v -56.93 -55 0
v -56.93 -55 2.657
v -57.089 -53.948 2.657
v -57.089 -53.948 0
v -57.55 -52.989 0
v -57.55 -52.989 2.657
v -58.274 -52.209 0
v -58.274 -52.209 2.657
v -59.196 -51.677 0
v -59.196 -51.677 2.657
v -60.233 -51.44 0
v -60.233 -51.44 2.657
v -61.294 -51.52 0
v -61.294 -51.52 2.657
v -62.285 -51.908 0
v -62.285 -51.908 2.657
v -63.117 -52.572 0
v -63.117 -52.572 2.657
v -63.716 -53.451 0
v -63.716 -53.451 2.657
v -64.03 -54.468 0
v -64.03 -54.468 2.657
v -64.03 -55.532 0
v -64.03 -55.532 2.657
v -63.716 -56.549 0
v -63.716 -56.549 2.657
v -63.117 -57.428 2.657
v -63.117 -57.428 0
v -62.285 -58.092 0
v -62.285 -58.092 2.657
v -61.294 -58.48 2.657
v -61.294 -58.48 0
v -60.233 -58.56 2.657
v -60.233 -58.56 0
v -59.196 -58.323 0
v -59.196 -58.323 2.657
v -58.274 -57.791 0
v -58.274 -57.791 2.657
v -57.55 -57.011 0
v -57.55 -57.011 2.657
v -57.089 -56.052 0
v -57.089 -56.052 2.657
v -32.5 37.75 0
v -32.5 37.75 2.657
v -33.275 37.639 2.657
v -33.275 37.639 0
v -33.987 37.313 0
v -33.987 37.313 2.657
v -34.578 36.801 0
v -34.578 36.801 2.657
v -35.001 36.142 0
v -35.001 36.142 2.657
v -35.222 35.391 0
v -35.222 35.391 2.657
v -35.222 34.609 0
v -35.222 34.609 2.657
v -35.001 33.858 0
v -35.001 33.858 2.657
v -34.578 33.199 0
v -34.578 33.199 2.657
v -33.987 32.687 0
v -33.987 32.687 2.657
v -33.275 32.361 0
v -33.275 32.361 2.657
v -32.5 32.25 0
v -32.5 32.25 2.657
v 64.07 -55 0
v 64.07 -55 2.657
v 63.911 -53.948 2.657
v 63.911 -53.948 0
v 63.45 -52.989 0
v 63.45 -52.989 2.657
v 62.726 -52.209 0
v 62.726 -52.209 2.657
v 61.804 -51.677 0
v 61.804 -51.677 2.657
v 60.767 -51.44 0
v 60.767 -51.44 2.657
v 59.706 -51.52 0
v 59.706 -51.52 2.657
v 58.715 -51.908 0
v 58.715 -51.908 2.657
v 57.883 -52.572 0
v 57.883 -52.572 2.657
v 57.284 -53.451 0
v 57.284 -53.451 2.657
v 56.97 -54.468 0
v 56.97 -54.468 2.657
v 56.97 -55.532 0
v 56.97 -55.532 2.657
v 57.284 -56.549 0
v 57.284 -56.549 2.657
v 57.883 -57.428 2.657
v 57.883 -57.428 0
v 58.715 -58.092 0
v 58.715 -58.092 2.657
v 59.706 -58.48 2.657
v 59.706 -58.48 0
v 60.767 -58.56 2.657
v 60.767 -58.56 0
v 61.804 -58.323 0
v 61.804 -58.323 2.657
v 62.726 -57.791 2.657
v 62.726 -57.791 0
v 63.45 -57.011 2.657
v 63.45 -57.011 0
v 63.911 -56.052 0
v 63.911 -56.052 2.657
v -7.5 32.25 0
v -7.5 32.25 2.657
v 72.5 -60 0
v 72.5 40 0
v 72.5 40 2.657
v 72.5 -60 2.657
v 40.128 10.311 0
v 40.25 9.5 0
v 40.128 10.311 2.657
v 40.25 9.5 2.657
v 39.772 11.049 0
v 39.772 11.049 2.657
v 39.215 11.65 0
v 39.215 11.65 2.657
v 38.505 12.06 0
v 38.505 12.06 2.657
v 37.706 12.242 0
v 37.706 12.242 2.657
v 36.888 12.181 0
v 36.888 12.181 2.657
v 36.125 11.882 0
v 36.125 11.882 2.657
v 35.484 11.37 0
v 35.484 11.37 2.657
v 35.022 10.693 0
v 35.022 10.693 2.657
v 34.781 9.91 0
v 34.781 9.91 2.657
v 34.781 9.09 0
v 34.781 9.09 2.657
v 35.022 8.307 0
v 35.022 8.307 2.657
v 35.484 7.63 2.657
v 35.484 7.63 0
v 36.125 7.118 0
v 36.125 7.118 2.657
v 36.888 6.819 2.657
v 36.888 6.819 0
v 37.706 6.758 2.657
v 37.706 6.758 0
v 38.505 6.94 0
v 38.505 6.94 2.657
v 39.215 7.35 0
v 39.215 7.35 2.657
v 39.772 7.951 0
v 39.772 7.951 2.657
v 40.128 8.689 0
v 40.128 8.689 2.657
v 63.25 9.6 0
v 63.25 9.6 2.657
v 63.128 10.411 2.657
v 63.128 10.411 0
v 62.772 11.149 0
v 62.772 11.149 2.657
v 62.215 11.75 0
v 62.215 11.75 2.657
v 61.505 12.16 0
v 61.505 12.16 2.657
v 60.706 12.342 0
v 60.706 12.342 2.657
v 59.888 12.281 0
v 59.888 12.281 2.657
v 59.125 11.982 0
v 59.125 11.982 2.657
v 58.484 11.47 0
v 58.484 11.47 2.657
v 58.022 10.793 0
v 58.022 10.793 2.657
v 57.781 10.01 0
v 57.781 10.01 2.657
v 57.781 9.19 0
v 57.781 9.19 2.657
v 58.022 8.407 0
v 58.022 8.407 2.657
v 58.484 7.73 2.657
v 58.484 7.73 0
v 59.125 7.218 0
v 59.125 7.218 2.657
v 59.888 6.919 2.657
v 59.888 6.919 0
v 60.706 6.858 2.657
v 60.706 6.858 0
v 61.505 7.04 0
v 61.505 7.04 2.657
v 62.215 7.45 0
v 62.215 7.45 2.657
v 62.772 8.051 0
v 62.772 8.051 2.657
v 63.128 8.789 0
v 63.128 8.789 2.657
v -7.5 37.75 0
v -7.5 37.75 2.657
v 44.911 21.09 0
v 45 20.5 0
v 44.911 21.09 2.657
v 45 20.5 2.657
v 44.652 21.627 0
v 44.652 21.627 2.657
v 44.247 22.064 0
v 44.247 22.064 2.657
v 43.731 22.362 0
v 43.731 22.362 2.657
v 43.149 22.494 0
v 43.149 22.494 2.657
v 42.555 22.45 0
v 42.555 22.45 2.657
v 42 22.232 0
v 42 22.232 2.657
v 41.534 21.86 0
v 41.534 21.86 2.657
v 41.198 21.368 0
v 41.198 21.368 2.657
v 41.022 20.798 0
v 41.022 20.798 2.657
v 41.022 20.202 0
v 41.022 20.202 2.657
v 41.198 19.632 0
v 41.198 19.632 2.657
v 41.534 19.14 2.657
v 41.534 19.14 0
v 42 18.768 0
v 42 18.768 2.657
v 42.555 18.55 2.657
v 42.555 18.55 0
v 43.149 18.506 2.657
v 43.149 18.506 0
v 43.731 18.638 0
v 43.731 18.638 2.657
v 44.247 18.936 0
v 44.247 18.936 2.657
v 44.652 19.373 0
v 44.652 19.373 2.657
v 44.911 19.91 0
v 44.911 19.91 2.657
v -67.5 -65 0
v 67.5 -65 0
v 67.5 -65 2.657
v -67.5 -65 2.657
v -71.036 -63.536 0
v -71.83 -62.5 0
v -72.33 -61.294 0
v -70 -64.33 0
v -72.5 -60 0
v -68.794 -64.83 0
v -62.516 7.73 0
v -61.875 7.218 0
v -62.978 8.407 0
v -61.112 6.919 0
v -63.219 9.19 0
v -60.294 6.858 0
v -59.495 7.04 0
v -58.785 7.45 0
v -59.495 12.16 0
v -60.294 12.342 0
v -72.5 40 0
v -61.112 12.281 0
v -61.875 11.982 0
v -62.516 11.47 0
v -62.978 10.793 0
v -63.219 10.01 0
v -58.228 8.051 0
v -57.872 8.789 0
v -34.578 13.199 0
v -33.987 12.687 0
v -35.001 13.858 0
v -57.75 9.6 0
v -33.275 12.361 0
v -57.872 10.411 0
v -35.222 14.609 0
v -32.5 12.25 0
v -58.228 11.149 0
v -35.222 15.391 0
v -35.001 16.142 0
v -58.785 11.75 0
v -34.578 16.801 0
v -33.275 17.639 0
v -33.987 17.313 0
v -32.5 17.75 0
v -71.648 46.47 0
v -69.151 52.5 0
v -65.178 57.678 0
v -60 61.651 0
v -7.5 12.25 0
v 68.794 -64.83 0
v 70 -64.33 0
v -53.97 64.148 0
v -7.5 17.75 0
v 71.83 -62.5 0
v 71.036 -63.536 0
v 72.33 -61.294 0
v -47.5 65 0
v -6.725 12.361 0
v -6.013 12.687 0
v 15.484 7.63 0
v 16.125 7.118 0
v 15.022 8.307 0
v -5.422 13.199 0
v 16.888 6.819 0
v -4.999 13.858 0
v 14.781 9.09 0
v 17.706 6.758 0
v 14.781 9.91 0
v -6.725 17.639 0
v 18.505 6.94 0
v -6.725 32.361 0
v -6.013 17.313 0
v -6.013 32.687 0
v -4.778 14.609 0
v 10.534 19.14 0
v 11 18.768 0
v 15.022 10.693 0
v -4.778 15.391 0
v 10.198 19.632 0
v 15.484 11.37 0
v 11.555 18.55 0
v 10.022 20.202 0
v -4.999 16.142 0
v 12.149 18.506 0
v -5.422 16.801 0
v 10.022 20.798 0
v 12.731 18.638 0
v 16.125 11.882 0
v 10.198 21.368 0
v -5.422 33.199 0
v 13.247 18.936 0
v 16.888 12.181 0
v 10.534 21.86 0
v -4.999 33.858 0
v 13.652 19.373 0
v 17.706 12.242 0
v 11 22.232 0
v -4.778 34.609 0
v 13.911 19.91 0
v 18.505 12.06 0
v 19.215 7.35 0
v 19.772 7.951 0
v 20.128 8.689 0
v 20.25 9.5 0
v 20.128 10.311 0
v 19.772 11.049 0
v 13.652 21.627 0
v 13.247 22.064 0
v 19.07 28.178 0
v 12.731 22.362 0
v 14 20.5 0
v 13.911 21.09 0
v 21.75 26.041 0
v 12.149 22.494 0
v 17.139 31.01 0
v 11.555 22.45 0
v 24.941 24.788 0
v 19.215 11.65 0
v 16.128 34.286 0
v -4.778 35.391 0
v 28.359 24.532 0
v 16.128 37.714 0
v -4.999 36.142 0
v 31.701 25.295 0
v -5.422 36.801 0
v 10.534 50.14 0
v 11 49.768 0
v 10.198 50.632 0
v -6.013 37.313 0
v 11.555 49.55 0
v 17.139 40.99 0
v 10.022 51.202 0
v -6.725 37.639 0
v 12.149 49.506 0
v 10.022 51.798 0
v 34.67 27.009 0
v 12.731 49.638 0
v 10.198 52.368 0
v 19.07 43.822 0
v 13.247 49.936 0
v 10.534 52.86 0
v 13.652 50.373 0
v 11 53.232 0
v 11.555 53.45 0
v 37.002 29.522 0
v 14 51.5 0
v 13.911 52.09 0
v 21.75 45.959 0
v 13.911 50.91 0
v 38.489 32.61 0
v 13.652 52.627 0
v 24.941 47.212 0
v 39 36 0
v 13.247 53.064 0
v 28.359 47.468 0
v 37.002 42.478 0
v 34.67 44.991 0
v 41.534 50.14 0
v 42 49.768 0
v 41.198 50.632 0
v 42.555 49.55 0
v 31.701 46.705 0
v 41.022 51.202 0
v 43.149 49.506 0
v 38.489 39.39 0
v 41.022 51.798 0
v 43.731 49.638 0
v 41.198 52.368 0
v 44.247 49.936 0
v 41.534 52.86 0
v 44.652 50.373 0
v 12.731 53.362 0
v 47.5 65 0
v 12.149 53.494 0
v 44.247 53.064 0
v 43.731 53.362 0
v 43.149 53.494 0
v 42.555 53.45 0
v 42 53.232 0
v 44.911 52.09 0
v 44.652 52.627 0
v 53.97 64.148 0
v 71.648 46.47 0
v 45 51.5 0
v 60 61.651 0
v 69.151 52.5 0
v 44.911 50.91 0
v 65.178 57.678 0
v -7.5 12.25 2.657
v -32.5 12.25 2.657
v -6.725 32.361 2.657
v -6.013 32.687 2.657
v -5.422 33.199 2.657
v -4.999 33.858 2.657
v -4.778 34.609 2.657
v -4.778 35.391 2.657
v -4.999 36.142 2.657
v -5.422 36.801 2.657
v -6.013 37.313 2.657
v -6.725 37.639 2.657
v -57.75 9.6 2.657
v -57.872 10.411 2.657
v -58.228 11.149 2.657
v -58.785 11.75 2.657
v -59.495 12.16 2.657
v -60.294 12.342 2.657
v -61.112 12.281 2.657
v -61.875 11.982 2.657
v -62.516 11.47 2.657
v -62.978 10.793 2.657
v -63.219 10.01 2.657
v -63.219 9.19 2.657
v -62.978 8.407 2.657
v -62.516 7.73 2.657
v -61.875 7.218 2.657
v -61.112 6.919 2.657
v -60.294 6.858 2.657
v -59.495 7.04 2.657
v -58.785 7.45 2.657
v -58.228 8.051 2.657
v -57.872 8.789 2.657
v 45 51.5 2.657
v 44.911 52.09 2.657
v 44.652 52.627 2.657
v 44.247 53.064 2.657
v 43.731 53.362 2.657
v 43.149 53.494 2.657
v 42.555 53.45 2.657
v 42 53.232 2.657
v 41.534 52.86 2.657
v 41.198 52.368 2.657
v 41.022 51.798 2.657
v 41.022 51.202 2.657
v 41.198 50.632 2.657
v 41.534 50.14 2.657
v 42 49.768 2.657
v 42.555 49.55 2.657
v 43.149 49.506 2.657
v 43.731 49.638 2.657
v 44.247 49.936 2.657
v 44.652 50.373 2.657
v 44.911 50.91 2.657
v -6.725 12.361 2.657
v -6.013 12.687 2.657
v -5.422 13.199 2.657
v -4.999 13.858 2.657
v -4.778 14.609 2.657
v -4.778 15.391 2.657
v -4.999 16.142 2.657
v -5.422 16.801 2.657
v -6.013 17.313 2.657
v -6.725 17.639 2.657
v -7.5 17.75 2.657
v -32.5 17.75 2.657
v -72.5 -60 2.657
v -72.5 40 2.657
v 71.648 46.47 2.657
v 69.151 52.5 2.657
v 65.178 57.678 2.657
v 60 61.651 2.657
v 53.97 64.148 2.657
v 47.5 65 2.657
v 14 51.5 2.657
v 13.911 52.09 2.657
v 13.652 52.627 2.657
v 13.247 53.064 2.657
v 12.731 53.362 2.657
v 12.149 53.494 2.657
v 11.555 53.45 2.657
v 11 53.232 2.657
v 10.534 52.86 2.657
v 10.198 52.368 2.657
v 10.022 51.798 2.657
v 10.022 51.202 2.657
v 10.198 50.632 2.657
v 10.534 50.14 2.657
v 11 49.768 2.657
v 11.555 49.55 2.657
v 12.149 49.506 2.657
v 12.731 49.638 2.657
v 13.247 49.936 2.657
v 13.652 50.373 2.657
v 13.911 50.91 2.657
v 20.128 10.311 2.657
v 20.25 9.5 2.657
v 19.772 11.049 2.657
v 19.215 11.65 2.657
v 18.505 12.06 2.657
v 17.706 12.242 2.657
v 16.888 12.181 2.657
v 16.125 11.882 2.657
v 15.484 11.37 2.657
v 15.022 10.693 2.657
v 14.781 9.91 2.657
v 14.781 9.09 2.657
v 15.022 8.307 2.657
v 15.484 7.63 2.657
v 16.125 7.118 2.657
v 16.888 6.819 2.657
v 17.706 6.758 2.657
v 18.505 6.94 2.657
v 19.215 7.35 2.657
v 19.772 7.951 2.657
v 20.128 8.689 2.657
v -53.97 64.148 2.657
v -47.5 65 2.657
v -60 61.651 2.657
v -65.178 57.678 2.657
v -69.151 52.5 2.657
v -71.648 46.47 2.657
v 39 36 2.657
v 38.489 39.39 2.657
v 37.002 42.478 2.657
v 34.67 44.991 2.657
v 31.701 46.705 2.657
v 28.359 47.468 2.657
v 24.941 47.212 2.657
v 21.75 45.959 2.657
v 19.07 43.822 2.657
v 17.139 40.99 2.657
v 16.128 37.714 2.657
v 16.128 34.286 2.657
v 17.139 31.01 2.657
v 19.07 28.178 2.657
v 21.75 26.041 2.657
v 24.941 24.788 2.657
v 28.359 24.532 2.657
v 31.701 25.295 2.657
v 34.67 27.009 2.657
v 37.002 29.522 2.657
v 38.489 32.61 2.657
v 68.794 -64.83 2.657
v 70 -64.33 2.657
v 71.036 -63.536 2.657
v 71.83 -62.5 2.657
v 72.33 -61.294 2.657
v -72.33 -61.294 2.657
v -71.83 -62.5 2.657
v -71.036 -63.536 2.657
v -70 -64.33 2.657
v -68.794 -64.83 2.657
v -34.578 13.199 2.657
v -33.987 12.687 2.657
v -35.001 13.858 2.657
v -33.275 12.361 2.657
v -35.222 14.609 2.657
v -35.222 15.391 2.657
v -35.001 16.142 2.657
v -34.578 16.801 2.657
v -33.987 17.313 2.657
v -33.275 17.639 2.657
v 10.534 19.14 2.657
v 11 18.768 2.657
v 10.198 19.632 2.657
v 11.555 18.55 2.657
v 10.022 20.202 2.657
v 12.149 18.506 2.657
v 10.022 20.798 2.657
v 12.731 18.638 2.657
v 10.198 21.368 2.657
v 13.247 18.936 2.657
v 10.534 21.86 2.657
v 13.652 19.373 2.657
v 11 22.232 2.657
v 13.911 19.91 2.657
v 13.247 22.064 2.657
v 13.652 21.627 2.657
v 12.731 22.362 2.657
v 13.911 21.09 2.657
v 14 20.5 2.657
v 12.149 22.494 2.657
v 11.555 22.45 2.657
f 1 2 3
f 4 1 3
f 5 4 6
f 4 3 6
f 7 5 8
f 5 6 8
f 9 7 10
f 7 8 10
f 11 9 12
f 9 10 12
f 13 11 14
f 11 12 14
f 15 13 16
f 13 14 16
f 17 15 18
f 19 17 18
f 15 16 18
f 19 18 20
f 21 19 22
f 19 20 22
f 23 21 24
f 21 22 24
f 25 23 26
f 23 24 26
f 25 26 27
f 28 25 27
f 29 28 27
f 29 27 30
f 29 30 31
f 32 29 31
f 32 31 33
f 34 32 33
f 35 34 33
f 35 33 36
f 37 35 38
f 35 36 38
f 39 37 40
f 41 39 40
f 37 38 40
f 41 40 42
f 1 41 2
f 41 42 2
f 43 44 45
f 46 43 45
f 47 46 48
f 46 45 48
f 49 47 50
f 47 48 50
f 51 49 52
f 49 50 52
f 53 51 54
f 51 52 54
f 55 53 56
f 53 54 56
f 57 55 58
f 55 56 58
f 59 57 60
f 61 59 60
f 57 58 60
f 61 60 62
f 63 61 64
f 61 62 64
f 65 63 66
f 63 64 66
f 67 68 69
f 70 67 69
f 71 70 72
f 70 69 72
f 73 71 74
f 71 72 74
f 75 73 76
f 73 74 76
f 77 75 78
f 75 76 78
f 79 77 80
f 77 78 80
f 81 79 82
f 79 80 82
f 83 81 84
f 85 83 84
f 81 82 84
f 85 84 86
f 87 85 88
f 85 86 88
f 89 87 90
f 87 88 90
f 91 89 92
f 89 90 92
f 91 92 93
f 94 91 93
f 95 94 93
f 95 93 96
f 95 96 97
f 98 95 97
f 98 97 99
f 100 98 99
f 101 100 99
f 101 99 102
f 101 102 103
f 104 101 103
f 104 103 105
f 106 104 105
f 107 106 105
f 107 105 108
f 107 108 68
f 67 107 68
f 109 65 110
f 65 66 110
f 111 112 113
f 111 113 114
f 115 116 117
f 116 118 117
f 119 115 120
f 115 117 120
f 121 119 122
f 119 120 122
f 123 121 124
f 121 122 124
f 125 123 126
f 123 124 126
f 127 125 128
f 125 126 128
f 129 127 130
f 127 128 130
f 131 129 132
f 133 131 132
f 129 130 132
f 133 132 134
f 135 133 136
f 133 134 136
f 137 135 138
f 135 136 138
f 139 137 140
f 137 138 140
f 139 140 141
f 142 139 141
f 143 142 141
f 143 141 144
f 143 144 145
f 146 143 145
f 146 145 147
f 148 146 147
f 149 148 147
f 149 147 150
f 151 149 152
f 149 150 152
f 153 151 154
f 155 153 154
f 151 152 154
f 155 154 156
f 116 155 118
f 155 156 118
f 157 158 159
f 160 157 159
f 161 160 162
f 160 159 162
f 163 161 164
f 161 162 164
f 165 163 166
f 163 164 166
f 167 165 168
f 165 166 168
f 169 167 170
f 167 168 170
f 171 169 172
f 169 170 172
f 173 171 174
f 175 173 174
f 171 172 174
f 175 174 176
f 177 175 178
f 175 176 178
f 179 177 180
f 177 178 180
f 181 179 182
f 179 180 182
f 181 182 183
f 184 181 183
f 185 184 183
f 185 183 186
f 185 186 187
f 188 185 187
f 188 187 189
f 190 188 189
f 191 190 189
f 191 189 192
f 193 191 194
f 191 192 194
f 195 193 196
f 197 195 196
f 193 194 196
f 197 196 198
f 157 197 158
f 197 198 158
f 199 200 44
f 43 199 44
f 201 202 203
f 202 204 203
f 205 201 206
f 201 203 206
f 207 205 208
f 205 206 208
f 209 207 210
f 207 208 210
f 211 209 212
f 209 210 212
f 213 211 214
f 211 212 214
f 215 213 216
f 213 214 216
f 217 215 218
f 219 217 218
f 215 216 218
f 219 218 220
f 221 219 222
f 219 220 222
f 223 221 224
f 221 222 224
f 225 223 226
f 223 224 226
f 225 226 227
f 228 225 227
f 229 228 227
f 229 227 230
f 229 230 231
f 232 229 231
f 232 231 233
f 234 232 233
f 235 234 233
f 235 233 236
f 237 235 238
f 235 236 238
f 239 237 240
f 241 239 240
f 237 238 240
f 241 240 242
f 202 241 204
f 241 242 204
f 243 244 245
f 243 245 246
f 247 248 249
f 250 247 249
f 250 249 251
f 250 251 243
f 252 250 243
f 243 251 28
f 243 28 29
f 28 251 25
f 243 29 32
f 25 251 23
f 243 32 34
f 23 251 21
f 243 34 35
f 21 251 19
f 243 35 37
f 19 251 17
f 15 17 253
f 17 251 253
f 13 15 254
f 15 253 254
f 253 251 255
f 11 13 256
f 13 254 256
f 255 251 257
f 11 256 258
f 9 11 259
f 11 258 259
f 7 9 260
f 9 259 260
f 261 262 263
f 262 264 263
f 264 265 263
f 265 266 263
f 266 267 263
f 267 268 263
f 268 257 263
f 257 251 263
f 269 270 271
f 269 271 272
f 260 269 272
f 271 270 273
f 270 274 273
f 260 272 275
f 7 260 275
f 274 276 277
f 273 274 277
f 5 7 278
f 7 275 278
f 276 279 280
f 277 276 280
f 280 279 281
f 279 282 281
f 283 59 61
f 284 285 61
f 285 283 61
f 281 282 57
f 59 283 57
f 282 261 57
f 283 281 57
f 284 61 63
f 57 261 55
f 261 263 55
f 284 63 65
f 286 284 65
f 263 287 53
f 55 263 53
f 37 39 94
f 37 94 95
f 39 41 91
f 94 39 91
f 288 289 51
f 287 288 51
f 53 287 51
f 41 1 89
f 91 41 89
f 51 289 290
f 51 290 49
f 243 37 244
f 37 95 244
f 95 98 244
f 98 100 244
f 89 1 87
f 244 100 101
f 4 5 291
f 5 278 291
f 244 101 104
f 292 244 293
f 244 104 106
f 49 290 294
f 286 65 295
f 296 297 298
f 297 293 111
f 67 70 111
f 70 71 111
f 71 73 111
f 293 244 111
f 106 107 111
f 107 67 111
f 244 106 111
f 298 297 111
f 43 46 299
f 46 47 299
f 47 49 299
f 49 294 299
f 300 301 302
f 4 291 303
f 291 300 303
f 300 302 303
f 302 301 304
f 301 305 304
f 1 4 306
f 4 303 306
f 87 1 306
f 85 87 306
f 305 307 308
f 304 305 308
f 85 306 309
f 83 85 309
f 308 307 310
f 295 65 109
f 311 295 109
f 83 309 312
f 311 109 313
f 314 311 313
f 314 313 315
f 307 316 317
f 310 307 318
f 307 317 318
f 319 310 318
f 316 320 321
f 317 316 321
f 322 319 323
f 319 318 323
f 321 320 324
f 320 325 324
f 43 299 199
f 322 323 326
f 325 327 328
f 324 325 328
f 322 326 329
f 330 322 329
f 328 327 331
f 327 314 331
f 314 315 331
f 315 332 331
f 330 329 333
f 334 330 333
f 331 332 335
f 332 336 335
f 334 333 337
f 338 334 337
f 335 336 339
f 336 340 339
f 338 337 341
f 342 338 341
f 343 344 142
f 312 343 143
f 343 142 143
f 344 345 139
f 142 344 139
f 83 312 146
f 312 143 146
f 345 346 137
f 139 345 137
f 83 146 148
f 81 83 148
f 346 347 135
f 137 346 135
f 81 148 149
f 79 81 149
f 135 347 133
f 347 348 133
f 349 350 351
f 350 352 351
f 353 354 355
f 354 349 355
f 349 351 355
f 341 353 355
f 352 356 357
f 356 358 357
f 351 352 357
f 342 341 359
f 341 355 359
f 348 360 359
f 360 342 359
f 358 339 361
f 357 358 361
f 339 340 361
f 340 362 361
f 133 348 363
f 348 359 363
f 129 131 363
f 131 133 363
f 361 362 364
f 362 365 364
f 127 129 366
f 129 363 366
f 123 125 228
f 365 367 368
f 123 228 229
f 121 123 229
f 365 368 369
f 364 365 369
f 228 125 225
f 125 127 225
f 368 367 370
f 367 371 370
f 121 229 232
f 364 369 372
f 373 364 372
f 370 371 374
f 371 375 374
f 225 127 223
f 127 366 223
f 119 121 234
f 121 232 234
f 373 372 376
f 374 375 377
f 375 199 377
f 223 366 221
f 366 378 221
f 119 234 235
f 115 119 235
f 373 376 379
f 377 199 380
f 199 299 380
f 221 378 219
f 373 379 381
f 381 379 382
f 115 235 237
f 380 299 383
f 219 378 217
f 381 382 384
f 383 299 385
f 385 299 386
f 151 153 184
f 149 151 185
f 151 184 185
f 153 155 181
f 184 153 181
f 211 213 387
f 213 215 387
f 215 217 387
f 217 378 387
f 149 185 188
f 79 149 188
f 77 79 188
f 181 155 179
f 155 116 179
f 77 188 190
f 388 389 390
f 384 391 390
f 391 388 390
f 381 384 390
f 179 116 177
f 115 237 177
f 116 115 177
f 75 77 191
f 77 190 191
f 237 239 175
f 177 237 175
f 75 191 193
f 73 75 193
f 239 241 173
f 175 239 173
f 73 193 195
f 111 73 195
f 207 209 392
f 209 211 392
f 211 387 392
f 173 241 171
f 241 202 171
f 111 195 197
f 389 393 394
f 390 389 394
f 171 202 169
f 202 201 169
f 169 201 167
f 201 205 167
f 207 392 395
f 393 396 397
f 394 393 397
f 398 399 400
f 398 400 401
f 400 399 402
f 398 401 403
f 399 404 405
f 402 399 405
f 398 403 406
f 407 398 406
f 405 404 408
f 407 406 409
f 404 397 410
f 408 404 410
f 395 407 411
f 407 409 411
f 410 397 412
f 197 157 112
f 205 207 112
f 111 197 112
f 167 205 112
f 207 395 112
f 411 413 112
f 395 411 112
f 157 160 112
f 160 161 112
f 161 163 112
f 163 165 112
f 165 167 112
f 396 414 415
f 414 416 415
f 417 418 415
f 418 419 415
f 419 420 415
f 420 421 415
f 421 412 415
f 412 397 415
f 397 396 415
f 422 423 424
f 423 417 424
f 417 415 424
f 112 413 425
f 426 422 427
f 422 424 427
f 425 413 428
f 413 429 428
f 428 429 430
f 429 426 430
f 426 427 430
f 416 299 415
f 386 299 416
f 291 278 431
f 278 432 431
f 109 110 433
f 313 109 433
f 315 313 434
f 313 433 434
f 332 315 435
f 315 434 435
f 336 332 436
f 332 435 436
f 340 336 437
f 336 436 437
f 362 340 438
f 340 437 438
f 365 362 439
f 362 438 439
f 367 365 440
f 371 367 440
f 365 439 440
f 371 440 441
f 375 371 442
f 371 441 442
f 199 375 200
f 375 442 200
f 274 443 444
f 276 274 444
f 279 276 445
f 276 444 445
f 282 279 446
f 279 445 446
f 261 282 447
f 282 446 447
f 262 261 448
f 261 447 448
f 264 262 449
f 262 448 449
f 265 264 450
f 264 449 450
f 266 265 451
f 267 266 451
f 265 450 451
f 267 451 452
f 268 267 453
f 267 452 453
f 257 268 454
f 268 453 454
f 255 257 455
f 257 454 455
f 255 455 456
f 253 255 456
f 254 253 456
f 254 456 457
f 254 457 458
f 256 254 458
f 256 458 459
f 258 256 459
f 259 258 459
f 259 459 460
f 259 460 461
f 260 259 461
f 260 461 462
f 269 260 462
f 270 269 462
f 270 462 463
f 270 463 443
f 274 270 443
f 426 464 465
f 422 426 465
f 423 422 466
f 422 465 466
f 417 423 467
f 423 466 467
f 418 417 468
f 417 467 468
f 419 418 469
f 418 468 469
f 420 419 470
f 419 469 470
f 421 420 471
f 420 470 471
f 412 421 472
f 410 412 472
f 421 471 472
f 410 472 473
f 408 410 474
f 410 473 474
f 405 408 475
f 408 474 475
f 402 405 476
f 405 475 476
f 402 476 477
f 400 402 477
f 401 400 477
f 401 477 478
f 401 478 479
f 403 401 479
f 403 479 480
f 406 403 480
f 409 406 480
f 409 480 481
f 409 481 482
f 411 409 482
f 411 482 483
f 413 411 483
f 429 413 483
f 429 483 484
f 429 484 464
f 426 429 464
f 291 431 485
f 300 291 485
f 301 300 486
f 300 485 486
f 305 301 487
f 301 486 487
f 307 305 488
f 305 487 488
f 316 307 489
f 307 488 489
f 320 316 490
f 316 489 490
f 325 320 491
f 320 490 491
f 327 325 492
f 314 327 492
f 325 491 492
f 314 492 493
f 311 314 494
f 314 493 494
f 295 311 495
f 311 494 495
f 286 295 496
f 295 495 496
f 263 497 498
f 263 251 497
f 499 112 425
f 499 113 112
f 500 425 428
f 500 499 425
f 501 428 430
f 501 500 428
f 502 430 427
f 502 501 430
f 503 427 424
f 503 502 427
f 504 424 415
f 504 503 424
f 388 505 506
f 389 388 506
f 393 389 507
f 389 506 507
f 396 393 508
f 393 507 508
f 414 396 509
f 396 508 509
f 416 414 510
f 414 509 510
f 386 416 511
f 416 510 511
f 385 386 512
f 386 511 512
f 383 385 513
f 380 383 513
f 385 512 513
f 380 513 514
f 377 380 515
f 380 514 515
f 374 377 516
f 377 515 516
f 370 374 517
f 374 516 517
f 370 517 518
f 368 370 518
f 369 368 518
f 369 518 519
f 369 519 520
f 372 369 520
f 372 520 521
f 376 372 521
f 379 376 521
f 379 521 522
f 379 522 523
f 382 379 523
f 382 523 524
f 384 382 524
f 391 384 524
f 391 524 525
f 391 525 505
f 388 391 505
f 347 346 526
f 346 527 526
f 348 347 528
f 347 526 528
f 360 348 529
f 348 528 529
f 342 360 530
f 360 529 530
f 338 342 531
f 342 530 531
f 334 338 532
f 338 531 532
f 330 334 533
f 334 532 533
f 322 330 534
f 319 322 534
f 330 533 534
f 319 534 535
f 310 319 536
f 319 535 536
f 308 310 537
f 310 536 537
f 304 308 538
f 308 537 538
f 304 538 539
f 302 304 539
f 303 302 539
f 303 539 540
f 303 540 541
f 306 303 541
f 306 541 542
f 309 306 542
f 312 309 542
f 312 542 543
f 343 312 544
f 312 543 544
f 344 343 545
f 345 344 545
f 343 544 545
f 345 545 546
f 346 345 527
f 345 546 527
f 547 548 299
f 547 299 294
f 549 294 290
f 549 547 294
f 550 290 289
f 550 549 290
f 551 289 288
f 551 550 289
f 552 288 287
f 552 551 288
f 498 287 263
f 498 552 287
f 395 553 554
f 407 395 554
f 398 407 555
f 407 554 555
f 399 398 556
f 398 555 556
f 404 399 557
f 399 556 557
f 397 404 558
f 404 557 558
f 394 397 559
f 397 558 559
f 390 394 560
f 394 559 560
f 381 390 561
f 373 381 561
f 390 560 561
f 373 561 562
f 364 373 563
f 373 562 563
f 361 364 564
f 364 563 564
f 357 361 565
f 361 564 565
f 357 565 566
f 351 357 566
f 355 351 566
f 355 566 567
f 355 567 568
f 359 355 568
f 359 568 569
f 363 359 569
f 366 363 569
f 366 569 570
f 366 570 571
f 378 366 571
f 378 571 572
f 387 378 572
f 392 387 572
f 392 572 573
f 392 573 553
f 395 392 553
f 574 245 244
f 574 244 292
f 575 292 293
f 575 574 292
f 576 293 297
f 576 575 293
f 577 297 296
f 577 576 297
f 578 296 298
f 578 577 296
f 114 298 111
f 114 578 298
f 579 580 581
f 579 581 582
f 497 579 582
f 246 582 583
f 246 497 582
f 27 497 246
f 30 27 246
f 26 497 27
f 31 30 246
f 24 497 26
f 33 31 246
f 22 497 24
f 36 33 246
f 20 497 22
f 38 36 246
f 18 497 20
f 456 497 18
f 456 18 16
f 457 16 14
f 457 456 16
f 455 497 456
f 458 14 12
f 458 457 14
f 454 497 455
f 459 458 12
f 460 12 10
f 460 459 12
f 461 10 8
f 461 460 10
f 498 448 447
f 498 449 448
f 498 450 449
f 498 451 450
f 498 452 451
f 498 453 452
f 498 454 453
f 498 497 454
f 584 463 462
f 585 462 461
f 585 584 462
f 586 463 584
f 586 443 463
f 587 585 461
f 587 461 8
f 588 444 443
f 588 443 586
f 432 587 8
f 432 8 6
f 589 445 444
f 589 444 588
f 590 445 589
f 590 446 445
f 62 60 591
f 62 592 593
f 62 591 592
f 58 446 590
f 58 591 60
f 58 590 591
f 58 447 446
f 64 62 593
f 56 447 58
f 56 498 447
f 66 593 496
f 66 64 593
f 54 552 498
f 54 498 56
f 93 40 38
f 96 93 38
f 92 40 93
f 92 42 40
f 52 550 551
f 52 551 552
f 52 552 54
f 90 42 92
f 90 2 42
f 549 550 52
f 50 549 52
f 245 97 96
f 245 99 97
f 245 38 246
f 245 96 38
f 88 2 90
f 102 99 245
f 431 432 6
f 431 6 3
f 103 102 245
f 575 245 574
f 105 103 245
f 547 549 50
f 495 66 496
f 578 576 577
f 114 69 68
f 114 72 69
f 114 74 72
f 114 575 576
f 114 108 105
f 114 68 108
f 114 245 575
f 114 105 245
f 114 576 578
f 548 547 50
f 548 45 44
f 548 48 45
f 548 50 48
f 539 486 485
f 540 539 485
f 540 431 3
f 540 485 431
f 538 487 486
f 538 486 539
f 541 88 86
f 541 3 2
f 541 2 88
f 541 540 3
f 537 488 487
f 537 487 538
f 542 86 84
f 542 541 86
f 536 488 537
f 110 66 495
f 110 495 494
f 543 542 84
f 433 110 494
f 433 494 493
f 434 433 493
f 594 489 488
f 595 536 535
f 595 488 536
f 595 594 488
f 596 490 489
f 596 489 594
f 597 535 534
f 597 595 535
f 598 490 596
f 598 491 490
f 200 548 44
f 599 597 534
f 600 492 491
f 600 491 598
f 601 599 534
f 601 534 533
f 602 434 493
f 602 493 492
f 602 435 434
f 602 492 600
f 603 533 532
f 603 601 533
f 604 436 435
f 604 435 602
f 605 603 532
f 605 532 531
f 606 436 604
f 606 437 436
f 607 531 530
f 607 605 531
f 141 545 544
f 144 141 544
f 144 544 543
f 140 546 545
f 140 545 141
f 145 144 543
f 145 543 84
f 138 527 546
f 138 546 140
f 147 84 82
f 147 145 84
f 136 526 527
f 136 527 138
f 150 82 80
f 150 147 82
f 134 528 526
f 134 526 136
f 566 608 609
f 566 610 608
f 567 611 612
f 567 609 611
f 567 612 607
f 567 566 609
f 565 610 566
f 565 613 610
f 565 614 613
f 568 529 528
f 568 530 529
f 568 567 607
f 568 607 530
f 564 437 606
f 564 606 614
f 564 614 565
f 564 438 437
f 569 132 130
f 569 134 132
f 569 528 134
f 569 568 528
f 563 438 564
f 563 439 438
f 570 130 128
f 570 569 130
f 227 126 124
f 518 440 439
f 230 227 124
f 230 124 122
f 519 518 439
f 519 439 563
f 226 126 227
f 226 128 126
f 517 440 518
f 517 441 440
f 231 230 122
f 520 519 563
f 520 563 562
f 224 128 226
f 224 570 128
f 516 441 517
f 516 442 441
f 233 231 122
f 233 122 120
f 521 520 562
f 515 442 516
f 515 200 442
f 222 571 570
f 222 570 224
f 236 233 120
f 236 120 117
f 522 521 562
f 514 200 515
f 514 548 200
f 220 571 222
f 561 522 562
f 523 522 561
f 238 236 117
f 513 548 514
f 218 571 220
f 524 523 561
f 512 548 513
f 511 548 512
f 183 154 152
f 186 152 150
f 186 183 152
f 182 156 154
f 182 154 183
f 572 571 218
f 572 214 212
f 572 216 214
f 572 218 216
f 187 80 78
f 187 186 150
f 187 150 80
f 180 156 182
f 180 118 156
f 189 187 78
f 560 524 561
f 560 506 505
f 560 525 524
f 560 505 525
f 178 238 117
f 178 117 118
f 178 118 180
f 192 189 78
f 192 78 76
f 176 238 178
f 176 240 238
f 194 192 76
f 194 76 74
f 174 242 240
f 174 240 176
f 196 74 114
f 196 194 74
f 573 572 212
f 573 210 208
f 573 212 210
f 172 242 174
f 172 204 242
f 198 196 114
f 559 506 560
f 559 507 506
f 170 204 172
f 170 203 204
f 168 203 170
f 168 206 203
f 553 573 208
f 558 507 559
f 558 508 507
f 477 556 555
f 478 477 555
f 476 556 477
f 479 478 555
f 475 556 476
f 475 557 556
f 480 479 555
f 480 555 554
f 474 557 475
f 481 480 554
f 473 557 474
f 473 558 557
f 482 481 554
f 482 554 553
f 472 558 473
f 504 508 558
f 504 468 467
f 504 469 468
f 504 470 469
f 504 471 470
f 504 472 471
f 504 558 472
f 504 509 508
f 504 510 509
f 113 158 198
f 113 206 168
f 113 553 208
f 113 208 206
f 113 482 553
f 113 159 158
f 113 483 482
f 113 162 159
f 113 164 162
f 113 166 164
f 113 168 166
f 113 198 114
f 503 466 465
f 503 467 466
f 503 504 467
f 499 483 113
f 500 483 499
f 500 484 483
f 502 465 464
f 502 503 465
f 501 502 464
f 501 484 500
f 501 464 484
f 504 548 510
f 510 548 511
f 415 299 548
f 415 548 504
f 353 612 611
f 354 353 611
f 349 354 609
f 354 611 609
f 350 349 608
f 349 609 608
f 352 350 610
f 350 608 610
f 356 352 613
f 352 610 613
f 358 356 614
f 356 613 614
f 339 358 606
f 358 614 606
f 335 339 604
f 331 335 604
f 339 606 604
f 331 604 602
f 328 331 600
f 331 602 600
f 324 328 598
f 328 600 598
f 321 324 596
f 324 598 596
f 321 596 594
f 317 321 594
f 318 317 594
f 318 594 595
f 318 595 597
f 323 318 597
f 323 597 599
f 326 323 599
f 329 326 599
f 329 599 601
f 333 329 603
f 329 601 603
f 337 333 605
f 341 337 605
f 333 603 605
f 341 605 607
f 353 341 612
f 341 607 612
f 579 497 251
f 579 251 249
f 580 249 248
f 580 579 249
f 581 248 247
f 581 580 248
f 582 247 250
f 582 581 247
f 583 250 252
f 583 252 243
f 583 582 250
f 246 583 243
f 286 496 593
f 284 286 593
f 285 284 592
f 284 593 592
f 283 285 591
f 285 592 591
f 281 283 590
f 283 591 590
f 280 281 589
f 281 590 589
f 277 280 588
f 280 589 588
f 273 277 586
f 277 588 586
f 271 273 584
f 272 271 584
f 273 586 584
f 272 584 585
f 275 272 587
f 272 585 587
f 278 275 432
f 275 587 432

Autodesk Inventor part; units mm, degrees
ref_plane "YZ Plane" through (0, 0, 0) normal (1, 0, 0) x (0, 1, 0)
ref_plane "XZ Plane" through (0, 0, 0) normal (0, 1, 0) x (-1, 0, 0)
ref_plane "XY Plane" through (0, 0, 0) normal (0, 0, 1) x (1, 0, 0)
sketch "Sketch1" plane through (0, 0, 0) normal (0, 0, 1) x (1, 0, 0)
  line L0 (-72.5, 65) -> (72.5, 65)
  line L1 (72.5, 65) -> (72.5, -65)
  line L2 (72.5, -65) -> (-72.5, -65)
  line L3 (-72.5, -65) -> (-72.5, 65)
  point P0 (0, 0)
  dimension "d0" = 145
  dimension "d1" = 130
  dimension "d2" = 65
  dimension "d3" = 72.5
extrude "profile" add sketch "Sketch1" along normal blind 2.6568
sketch "Sketch2" plane through (0, 0, 2.6568) normal (0, 0, 1) x (1, 0, 0)
  line L0 (72.5, 65) -> (-72.5, 65) projected
  line L1 (-72.5, 65) -> (-72.5, -65) projected
  line L2 (-32.5, 35) -> (-7.5, 35) construction
  line L3 (-32.5, 32.25) -> (-7.5, 32.25)
  line L4 (-7.5, 37.75) -> (-32.5, 37.75)
  arc A0 (-32.5, 37.75) -> (-32.5, 32.25) centre (-32.5, 35) ccw
  arc A1 (-7.5, 32.25) -> (-7.5, 37.75) centre (-7.5, 35) ccw
  point P0 (0, 0)
  point P1 (-20, 35)
  dimension "d6" = 25
  dimension "d7" = 5.5
  dimension "d8" = 30
  dimension "d9" = 40
extrude "x_slots" cut sketch "Sketch2" against normal through all
pattern_linear "Rectangular Pattern1" count 2 spacing 20 along (0, -1, 0) of "x_slots"
sketch "Sketch3" plane through (0, 0, 2.6568) normal (0, 0, 1) x (1, 0, 0)
  line L0 (-72.5, 65) -> (-72.5, -65) projected
  line L1 (-72.5, -65) -> (72.5, -65) projected
  circle A0 centre (-60.5, -55) radius 3.57
  circle A1 centre (-60.5, 9.6) radius 2.75
  circle A2 centre (-60.5, 9.6) radius 11.75 construction
  point P0 (0, 0)
  dimension "d15" = 7.14
  dimension "d16" = 5.5
  dimension "d17" = 64.6
  dimension "d18" = 10
  dimension "d19" = 12
  dimension "d21" = 12
extrude "Extrusion3" cut sketch "Sketch3" against normal through all
pattern_linear "Rectangular Pattern2" count 2 spacing 121 along (1, 0, 0) of "Extrusion3"
sketch "Sketch4" plane through (0, 0, 2.6568) normal (0, 0, 1) x (1, 0, 0)
  line L0 (72.5, 65) -> (-72.5, 65) projected
  line L1 (72.5, -65) -> (72.5, 65) projected
  circle A0 centre (27.5, 36) radius 11.5
  circle A1 centre (12, 51.5) radius 2
  circle A2 centre (43, 51.5) radius 2
  circle A3 centre (12, 20.5) radius 2
  circle A4 centre (43, 20.5) radius 2
  point P0 (0, 0)
  dimension "d27" = 23
  dimension "d28" = 29
  dimension "d29" = 4
  dimension "d30" = 15.5
  dimension "d31" = 15.5
  dimension "d36" = 45
  dimension "d51" = 31
  dimension "d54" = 31
extrude "nema17_mount" cut sketch "Sketch4" against normal through all
fillet "Fillet1" radius 25 2 edges at (72.5, 65, 1.3284) (-72.5, 65, 1.3284)
sketch "Sketch5" plane through (0, 0, 2.6568) normal (0, 0, 1) x (1, 0, 0)
  line L0 (-72.5, 65) -> (-72.5, -65) projected
  line L1 (-72.5, -65) -> (72.5, -65) projected
  circle A0 centre (17.5, 9.5) radius 2.75
  line L2 (47.5, 65) -> (-72.5, 65) projected
  circle A1 centre (37.5, 9.5) radius 2.75
  point P0 (67.5, -65)
  point P1 (-72.5, 60)
  point P2 (-72.5, -60)
  point P3 (-67.5, -65)
  point P4 (0, 0)
  dimension "d41" = 5.5
  dimension "d42" = 74.5
  dimension "d43" = 90
  dimension "d59" = 20
extrude "idler_holes" cut sketch "Sketch5" against normal through all
fillet "Fillet3" radius 5 2 edges at (-72.5, -65, 1.3284) (72.5, -65, 1.3284)
equation "\"d2\" = 0.5 * d1"
equation "\"d3\" = 0.5 * d0"
properties part number "motor_mount_v2" material "Steel, Mild"
